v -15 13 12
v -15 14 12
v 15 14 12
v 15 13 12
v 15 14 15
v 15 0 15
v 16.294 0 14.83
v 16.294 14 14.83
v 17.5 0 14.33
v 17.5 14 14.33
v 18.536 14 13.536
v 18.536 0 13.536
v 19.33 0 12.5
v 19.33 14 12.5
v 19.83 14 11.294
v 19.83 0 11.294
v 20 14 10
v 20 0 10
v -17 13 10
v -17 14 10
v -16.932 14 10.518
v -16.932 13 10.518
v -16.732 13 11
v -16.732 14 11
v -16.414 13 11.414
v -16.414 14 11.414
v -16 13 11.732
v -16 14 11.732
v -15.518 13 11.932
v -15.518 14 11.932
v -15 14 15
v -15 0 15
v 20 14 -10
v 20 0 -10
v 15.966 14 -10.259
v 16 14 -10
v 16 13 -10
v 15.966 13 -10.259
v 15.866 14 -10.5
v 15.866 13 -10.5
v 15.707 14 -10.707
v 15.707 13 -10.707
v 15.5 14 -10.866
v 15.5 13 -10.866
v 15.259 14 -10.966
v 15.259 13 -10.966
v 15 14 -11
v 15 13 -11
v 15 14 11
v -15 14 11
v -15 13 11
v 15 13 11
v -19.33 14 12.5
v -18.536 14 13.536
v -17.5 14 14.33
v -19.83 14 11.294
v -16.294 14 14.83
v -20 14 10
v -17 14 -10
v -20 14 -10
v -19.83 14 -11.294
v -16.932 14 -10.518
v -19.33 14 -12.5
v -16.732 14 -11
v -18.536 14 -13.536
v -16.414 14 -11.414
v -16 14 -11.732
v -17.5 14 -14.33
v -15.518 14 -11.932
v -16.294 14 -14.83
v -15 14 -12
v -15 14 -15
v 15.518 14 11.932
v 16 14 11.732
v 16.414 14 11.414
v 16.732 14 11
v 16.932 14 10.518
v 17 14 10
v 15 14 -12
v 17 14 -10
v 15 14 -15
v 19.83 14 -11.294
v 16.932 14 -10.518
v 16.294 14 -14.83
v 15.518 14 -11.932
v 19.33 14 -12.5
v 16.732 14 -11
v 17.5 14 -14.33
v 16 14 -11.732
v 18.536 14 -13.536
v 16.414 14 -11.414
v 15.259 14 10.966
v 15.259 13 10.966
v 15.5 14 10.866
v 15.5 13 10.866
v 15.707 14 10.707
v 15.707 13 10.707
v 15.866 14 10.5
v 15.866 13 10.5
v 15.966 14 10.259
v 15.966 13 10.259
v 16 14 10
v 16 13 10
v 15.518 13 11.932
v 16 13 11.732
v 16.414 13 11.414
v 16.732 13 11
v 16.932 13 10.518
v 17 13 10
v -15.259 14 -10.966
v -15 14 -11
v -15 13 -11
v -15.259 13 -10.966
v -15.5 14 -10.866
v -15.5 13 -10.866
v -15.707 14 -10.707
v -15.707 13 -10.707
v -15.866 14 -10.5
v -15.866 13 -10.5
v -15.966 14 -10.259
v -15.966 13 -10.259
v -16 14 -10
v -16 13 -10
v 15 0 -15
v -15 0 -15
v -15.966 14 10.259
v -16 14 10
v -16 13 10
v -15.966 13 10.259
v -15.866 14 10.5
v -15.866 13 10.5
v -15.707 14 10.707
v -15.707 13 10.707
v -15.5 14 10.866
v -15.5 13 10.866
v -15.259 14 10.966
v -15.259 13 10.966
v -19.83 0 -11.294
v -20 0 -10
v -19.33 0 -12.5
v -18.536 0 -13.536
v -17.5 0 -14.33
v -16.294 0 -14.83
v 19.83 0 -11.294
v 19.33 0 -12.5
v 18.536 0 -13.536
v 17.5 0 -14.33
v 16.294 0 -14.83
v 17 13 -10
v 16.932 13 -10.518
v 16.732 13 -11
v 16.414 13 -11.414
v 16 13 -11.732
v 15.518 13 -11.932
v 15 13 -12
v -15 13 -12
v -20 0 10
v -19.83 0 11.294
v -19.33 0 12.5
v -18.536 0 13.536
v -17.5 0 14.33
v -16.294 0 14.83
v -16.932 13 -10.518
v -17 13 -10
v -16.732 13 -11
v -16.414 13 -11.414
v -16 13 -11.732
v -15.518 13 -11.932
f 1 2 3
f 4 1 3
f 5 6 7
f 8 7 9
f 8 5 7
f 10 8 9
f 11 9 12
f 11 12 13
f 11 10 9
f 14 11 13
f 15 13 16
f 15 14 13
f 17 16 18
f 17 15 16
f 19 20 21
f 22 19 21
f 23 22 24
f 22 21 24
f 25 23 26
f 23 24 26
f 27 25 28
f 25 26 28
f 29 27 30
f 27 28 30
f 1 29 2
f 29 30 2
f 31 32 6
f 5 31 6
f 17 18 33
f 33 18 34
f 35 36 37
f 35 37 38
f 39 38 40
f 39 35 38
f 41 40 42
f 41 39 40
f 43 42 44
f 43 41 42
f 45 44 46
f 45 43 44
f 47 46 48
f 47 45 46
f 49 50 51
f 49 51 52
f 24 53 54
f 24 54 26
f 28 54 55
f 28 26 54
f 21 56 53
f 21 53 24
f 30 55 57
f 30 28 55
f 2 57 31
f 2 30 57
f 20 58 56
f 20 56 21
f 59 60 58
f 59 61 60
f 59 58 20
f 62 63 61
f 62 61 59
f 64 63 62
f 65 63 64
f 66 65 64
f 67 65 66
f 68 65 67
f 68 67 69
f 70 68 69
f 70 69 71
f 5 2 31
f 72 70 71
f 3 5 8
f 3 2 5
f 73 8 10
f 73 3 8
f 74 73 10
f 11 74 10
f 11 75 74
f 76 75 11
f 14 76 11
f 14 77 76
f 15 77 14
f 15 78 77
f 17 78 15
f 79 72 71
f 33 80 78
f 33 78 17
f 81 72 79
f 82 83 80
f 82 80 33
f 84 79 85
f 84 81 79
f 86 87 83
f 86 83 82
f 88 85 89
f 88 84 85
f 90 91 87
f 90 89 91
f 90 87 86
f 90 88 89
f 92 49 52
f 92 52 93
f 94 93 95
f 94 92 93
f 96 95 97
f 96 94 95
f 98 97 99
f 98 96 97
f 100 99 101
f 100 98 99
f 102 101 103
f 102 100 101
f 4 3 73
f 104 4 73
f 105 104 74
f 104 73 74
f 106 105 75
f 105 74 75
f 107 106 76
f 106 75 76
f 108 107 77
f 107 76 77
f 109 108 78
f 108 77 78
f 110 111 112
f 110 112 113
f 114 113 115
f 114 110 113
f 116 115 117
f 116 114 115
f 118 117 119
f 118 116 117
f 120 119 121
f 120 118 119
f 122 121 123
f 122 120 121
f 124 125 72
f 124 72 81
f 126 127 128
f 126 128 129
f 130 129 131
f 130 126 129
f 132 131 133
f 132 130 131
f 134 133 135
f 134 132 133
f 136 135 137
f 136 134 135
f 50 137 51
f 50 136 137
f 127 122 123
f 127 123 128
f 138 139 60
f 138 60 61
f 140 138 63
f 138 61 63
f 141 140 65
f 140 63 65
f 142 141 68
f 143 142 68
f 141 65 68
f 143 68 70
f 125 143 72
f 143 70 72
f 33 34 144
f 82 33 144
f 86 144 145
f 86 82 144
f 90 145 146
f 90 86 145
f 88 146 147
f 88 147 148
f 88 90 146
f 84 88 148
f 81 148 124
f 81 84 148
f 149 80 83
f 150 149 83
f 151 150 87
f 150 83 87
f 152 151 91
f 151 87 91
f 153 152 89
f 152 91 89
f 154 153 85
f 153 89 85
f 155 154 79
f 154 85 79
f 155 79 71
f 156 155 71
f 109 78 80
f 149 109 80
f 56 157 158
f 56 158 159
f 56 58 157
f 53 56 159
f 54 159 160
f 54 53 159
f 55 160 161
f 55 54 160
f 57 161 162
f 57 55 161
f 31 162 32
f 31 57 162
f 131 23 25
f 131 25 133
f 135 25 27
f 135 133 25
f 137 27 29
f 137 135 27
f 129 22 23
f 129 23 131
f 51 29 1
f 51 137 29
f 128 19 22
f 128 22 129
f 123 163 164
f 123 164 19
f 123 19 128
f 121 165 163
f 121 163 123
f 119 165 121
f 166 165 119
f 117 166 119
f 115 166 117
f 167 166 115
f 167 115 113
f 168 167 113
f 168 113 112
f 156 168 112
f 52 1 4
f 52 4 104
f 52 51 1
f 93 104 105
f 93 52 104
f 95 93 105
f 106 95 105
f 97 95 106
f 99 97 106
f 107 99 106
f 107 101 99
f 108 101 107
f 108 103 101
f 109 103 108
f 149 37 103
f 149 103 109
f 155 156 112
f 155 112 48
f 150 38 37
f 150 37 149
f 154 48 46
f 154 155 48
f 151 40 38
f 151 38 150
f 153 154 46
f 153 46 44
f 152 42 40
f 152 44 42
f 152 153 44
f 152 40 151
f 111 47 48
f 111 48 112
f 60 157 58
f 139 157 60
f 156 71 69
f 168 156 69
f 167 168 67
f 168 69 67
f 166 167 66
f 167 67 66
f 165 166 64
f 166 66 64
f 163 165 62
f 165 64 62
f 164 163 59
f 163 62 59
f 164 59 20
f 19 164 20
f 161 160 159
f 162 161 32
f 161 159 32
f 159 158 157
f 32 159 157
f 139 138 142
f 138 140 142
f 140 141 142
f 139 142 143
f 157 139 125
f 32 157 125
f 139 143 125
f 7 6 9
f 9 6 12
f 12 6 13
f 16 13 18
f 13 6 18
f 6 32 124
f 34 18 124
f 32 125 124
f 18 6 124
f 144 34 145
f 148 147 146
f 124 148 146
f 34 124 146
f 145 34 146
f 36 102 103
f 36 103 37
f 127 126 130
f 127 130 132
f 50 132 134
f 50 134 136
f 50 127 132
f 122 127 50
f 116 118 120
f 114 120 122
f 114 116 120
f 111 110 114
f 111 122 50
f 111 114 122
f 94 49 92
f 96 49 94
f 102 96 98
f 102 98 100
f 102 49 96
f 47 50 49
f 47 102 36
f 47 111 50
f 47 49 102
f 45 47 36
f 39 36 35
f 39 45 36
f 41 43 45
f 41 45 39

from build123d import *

# Parameters (mm, degrees)
SKETCH1_W           = 40
SKETCH1_H           = 30
BOSS_EXTRUDE1_DEPTH = 14
FILLET1_R           = 5
CUT_EXTRUDE1_DEPTH  = 1


with BuildPart() as part:
    # Sketch1 → Boss-Extrude1 (new body)
    with BuildSketch(Plane(origin=(0, 0, 0), x_dir=(1, 0, 0), z_dir=(0, 1, 0))):
        Rectangle(SKETCH1_W, SKETCH1_H)
    extrude(amount=BOSS_EXTRUDE1_DEPTH)

    # Fillet1
    fillet1_edges = [part.edges().sort_by_distance(p)[0] for p in [
        (20, 7, 15),
        (-20, 7, 15),
        (-20, 7, -15),
        (20, 7, -15),
    ]]
    fillet(fillet1_edges, radius=FILLET1_R)

    # Sketch2 → Cut-Extrude1 (cut)
    with BuildSketch(Plane(origin=(0, 14, 0), x_dir=(1, 0, 0), z_dir=(0, 1, 0))):
        with BuildLine():
            Line((15, 12), (-15, 12))
            ThreePointArc((-15, 12), (-16.414213562, 11.414213562), (-17, 10))
            Line((-17, 10), (-17, -10))
            ThreePointArc((-17, -10), (-16.414213562, -11.414213562), (-15, -12))
            Line((-15, -12), (15, -12))
            ThreePointArc((15, -12), (16.414213562, -11.414213562), (17, -10))
            Line((17, -10), (17, 10))
            ThreePointArc((17, 10), (16.414213562, 11.414213562), (15, 12))
        make_face()
        with BuildLine():
            Line((15, 11), (-15, 11))
            ThreePointArc((-15, 11), (-15.707106781, 10.707106781), (-16, 10))
            Line((-16, 10), (-16, -10))
            ThreePointArc((-16, -10), (-15.707106781, -10.707106781), (-15, -11))
            Line((-15, -11), (15, -11))
            ThreePointArc((15, -11), (15.707106781, -10.707106781), (16, -10))
            Line((16, -10), (16, 10))
            ThreePointArc((16, 10), (15.707106781, 10.707106781), (15, 11))
        make_face(mode=Mode.SUBTRACT)
    extrude(amount=-CUT_EXTRUDE1_DEPTH, mode=Mode.SUBTRACT)


solid = part.part
